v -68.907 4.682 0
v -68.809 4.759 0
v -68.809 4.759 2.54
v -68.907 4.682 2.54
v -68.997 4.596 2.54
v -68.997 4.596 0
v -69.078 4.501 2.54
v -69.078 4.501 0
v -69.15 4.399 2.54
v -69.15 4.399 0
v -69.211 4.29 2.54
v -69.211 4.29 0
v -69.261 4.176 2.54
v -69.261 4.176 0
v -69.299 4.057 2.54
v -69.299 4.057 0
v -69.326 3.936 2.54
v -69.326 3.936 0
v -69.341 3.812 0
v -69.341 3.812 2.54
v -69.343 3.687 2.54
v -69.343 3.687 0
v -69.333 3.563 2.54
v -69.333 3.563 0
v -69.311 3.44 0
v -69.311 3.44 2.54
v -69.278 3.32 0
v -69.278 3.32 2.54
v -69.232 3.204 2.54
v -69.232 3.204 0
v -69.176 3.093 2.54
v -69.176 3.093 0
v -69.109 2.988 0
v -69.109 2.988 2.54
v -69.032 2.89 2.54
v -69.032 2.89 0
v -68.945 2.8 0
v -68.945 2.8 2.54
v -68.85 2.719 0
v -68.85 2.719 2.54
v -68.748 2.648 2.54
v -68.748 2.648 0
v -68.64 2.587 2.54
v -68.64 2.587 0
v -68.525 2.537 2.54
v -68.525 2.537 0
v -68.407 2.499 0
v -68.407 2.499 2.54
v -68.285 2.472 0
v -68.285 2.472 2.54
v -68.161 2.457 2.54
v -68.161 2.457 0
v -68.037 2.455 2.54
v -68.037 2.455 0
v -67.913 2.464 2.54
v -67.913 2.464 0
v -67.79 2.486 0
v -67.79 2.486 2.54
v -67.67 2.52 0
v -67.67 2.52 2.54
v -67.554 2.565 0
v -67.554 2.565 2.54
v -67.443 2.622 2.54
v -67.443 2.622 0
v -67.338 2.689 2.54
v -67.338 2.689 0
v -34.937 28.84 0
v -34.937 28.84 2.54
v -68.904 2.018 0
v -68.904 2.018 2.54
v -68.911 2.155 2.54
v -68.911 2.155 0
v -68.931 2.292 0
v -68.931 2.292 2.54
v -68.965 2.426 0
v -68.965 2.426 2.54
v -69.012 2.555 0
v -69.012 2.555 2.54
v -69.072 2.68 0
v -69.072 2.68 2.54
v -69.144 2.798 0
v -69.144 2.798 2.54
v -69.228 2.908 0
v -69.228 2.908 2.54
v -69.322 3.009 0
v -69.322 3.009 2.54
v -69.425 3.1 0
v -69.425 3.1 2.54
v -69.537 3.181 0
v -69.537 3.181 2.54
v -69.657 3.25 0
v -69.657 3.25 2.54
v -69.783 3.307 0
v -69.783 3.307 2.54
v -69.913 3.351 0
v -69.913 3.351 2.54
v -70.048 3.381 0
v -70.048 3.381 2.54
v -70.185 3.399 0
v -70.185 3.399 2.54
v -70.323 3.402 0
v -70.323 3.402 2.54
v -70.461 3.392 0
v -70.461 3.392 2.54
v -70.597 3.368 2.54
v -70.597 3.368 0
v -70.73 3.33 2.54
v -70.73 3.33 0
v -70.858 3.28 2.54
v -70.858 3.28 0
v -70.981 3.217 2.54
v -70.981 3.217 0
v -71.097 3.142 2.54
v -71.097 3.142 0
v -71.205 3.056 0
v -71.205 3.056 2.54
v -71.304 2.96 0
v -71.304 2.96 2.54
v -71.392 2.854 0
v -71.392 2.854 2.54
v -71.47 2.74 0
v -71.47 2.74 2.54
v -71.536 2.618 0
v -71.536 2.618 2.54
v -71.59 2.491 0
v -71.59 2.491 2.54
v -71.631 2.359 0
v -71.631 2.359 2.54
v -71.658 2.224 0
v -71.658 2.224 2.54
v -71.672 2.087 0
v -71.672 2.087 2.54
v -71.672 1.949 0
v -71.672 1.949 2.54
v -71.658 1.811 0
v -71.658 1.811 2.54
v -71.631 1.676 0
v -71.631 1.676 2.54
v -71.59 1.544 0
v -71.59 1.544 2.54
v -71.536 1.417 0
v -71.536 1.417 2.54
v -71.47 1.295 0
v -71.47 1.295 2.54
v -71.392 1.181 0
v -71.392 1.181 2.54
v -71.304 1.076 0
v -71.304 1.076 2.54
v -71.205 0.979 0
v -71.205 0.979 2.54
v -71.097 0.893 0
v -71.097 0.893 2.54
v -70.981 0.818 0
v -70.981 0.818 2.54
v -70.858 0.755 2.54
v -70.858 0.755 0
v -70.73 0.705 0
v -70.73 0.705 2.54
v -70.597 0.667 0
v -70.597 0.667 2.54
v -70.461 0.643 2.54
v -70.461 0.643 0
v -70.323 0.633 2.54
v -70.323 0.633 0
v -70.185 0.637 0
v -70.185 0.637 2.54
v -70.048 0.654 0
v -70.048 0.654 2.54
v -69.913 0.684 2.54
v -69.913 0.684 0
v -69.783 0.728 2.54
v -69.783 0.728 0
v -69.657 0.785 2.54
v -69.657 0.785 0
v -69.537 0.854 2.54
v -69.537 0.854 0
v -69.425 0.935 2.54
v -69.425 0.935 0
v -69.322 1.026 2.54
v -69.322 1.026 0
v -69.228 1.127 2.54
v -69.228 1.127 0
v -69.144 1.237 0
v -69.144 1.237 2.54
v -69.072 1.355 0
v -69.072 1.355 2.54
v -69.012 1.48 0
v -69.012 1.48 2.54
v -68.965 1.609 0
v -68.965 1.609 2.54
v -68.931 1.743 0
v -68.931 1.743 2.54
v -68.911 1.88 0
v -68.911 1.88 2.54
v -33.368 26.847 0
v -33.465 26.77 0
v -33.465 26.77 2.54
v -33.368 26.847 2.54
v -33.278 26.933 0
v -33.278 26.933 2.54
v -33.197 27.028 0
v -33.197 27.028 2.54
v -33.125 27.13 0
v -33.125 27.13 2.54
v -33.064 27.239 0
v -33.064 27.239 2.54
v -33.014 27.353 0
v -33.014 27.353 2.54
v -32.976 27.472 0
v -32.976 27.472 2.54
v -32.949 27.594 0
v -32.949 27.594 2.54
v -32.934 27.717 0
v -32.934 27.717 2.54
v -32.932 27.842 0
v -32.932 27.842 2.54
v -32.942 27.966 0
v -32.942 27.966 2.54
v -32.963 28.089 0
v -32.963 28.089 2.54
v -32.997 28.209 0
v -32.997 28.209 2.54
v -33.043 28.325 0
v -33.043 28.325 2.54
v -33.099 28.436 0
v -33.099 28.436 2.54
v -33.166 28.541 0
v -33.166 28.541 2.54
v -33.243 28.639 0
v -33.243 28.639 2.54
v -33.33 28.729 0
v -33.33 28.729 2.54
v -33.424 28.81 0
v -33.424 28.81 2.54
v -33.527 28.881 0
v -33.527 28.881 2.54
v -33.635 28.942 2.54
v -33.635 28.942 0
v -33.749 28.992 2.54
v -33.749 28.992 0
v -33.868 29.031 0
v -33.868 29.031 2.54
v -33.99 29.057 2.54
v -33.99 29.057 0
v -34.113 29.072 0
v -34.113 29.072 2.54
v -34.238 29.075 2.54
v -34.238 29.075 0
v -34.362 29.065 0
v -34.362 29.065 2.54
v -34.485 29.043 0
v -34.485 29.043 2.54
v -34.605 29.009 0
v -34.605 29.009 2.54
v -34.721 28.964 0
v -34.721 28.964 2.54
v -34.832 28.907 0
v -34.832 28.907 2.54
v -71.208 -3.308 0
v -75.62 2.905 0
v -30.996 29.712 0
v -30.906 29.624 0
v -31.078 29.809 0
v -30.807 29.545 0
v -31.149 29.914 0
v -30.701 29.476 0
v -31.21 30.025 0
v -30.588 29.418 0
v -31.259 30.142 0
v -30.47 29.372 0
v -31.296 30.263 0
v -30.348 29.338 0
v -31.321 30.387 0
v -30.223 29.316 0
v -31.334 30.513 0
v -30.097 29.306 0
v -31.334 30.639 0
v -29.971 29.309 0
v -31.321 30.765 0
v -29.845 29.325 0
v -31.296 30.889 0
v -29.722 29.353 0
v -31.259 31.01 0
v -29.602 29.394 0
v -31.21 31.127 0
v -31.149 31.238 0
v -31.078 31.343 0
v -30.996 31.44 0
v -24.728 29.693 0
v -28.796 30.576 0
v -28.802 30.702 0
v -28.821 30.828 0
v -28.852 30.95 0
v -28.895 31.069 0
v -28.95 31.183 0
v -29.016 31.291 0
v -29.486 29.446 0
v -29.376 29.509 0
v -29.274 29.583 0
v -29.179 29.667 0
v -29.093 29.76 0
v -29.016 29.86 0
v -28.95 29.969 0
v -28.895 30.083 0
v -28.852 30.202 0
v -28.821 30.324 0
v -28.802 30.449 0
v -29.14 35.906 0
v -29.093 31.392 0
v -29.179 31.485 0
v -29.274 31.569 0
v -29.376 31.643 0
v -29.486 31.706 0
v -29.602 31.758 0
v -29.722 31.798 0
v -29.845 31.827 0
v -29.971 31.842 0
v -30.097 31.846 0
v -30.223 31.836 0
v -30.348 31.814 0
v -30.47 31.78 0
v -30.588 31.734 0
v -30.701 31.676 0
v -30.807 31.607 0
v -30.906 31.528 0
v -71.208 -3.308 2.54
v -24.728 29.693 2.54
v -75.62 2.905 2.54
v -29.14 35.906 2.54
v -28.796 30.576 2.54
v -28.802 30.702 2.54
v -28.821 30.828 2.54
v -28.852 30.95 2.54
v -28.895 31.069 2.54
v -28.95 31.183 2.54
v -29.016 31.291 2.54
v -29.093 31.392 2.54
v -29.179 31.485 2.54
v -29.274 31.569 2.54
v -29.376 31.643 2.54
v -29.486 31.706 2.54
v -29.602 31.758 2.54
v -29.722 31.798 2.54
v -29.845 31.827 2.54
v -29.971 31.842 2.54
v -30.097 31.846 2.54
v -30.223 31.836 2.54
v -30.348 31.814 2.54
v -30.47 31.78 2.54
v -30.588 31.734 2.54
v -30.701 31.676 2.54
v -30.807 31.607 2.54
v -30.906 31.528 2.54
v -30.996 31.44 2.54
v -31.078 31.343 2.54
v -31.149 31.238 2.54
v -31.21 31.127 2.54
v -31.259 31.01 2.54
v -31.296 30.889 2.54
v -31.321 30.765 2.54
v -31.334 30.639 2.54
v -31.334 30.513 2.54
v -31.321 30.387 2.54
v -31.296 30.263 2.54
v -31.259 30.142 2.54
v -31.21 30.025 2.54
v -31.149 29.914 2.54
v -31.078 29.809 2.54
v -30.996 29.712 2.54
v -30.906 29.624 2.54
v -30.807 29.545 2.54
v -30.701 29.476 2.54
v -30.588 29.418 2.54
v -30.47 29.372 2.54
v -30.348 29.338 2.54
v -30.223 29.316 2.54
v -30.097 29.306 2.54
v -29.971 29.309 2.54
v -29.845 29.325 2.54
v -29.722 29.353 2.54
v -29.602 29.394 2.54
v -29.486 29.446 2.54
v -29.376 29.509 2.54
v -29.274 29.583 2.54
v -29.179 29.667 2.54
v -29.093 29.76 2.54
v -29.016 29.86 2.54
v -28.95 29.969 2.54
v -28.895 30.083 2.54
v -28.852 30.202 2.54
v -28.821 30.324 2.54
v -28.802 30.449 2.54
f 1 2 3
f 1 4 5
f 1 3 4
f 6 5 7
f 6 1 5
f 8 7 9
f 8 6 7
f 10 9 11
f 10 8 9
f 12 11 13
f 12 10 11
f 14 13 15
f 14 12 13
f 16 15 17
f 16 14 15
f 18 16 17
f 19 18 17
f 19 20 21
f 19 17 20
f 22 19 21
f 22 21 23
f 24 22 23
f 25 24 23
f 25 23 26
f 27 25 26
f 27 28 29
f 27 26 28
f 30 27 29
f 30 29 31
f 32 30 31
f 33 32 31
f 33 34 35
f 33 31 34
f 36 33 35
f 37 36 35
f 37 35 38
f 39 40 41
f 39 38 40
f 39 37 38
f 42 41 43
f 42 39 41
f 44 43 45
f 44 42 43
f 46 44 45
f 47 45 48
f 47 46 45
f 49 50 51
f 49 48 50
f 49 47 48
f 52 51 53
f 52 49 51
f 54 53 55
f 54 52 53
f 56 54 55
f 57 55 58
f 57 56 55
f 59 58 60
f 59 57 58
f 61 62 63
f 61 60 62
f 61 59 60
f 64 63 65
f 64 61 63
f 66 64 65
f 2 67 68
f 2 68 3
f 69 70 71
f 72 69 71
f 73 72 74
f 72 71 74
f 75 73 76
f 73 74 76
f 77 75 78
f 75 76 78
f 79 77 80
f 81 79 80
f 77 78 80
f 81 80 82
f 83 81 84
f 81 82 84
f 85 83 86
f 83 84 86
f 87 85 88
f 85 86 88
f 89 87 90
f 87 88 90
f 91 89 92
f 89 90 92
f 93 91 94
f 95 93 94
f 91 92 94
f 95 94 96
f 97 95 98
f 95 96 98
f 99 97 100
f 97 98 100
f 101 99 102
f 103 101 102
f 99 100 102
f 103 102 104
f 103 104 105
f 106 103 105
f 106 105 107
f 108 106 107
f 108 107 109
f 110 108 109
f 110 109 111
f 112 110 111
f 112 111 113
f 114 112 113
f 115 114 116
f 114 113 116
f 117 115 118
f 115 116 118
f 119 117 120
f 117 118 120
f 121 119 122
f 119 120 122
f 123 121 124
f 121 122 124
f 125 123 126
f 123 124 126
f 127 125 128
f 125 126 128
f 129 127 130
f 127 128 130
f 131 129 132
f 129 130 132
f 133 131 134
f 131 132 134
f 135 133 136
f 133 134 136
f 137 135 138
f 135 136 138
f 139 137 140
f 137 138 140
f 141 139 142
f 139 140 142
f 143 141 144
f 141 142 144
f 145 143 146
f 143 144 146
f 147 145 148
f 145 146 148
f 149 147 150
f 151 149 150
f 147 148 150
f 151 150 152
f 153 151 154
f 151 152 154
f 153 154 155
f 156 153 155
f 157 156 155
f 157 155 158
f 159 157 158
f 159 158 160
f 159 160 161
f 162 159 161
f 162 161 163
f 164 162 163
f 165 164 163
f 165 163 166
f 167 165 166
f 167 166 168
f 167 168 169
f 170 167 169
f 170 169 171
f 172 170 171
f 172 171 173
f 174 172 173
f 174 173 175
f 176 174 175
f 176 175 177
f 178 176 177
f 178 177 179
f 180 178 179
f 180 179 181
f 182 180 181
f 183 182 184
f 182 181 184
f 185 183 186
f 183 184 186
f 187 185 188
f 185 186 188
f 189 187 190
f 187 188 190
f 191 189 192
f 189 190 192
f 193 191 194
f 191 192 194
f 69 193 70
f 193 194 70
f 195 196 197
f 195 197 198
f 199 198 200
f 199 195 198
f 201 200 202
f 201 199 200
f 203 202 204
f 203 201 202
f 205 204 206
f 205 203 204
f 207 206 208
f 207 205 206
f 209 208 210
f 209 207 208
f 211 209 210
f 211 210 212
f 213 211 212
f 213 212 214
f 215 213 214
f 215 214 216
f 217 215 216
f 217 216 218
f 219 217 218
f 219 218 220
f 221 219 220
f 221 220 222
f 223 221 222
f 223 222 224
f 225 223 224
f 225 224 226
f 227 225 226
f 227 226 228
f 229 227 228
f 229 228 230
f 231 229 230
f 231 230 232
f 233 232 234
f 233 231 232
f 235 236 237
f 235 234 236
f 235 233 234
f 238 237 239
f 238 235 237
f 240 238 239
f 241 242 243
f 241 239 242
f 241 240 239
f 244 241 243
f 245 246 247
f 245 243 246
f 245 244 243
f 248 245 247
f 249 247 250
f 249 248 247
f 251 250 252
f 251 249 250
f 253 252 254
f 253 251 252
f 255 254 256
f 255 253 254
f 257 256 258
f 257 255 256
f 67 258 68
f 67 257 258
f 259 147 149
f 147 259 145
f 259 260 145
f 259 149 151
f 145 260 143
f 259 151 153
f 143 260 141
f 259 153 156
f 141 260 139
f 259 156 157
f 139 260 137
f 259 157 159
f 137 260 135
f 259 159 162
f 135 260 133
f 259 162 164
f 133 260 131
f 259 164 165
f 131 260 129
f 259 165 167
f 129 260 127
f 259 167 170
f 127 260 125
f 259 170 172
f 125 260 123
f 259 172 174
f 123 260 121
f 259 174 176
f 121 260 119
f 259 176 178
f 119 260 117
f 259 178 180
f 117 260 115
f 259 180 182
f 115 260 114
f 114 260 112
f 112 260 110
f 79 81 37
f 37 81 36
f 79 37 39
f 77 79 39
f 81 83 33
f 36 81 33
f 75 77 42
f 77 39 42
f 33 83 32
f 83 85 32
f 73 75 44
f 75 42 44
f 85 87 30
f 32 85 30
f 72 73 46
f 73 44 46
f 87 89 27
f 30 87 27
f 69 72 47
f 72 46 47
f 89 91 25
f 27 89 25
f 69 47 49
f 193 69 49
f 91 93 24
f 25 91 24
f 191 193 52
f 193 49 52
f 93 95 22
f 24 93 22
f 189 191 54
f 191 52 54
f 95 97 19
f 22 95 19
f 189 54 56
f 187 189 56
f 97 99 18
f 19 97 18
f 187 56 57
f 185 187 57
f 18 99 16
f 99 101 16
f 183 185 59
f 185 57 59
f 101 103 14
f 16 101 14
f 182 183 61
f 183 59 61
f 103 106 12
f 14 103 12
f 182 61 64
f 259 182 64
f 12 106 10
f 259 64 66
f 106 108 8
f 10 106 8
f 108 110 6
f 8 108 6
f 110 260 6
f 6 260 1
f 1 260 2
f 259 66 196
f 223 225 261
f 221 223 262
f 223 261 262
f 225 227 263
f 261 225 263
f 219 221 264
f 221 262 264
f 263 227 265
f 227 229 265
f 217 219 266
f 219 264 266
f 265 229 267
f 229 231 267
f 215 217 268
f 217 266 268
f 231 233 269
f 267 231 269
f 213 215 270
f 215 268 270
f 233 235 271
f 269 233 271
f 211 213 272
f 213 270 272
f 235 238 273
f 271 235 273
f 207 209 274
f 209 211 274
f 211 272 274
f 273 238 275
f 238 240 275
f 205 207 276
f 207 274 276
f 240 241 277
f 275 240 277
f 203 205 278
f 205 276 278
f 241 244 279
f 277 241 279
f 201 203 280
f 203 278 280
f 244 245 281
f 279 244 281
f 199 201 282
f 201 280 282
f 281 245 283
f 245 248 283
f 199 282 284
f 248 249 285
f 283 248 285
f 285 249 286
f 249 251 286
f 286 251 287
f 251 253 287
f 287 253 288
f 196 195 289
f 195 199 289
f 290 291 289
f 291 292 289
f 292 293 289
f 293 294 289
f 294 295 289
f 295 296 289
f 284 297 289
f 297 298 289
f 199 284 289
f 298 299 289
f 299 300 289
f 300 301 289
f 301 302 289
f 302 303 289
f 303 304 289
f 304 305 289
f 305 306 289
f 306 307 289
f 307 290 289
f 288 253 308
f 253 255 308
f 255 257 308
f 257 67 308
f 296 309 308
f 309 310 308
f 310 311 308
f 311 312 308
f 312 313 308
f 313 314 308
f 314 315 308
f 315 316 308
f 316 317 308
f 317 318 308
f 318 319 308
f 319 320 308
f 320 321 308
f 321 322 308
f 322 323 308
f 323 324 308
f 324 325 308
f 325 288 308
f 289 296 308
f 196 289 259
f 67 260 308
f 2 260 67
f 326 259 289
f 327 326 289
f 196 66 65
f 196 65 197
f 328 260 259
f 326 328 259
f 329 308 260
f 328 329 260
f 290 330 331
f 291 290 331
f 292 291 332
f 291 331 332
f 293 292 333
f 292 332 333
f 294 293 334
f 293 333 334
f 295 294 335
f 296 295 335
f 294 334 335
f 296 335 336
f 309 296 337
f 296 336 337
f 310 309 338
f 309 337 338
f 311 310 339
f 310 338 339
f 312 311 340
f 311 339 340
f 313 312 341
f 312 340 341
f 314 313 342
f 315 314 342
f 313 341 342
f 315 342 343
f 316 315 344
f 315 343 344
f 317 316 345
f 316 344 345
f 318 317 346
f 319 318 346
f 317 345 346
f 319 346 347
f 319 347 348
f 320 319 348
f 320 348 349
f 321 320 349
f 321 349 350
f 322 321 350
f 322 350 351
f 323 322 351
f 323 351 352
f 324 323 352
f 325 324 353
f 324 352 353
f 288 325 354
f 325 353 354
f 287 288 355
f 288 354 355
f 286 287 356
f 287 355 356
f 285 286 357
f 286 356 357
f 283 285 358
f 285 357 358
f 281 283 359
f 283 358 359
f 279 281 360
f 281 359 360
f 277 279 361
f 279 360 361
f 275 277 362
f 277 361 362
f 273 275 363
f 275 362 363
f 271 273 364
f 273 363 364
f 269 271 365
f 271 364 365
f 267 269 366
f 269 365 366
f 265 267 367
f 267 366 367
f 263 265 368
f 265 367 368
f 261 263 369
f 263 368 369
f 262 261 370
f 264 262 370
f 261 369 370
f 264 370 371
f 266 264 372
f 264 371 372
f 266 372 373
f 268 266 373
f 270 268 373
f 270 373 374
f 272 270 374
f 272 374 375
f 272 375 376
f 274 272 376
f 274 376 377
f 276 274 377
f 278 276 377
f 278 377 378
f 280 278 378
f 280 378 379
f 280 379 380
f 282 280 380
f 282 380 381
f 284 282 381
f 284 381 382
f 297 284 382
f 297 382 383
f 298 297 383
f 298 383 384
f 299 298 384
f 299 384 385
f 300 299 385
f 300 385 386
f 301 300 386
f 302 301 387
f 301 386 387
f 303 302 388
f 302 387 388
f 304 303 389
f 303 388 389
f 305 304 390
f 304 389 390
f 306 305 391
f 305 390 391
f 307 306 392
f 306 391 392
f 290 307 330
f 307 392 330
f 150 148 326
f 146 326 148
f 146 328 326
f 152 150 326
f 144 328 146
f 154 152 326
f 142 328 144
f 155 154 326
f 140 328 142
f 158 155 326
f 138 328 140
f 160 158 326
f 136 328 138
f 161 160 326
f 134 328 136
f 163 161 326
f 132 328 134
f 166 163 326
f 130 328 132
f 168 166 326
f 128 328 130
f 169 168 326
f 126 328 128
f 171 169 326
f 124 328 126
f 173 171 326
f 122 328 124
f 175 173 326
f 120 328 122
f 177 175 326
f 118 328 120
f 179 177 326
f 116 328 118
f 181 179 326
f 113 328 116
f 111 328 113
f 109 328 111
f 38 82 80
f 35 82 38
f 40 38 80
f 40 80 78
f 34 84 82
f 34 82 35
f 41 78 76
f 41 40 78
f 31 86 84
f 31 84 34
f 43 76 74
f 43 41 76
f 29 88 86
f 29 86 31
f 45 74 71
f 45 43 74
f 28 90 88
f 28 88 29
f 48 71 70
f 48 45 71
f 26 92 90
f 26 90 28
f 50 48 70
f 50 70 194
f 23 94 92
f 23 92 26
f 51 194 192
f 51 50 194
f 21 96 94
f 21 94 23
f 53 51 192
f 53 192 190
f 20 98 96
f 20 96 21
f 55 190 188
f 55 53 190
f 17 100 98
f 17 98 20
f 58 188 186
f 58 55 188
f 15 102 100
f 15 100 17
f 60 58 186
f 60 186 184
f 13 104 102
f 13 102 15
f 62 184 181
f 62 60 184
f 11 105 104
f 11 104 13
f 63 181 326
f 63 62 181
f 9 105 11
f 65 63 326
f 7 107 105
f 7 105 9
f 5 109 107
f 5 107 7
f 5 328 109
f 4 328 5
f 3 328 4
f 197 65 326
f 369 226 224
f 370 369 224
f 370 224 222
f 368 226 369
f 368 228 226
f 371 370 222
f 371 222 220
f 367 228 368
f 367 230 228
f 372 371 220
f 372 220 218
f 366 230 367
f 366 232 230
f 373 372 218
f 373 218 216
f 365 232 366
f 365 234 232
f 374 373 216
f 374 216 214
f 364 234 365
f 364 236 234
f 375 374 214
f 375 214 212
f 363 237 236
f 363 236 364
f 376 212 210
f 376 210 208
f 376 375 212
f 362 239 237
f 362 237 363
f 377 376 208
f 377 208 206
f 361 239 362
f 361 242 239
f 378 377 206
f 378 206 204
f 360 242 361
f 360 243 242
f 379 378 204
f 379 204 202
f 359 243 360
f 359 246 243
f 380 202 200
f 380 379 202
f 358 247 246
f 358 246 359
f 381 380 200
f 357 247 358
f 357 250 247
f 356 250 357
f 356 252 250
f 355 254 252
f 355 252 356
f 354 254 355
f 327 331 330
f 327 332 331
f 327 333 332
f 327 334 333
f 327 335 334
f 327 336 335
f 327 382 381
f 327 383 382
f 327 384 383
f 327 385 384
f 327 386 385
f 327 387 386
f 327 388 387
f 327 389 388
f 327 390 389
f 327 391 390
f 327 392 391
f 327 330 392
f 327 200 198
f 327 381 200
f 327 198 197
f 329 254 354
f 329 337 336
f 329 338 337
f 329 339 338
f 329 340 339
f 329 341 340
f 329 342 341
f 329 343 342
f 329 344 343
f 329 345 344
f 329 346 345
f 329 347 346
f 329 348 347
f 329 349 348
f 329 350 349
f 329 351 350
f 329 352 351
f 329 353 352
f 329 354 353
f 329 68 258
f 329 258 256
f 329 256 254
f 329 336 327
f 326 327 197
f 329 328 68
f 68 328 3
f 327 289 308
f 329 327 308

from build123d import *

# Parameters (mm, degrees)
BOSS_EXTRUDE1_DEPTH     = 2.54
SKETCH2_R               = 1.384838531
SKETCH2_R_2             = 1.27
CUT_EXTRUDE2_DEPTH      = 2.54
CUT_EXTRUDE4_DEPTH      = 7.62
CUT_EXTRUDE4_DEPTH_BACK = 10.16


with BuildPart() as part:
    # Sketch1 → Boss-Extrude1 (new body)
    with BuildSketch(Plane.XY):
        Polygon((-71.208440462, -3.308212961), (-24.728354348, 29.69264818), (-29.139739371, 35.905866523), (-75.619825485, 2.905005382), align=None)
    extrude(amount=BOSS_EXTRUDE1_DEPTH)

    # Sketch2 → Cut-Extrude2 (cut)
    with BuildSketch(Plane.XY.offset(2.54)):
        with Locations((-70.288529602, 2.017574604)):
            Circle(SKETCH2_R)
        with Locations((-30.065513702, 30.575915893)):
            Circle(SKETCH2_R_2)
    extrude(amount=-CUT_EXTRUDE2_DEPTH, mode=Mode.SUBTRACT)

    # Sketch3 → Cut-Extrude4 (cut, two sides)
    with BuildSketch(Plane(origin=(0, 0, 0), x_dir=(-1, 0, 0), z_dir=(0, 0, -1))) as cut_extrude4_sk:
        with BuildLine():
            Line((67.337713358, 2.689008108), (33.465419067, 26.769994698))
            ThreePointArc((33.465419067, 26.769994698), (33.166213405, 28.540948106), (34.937166813, 28.840153767))
            Line((34.937166813, 28.840153767), (68.809461104, 4.759167177))
            ThreePointArc((68.809461104, 4.759167177), (69.108666765, 2.988213769), (67.337713358, 2.689008108))
        make_face()
    extrude(amount=CUT_EXTRUDE4_DEPTH, mode=Mode.SUBTRACT)
    extrude(cut_extrude4_sk.sketch, amount=-CUT_EXTRUDE4_DEPTH_BACK, mode=Mode.SUBTRACT)


solid = part.part
